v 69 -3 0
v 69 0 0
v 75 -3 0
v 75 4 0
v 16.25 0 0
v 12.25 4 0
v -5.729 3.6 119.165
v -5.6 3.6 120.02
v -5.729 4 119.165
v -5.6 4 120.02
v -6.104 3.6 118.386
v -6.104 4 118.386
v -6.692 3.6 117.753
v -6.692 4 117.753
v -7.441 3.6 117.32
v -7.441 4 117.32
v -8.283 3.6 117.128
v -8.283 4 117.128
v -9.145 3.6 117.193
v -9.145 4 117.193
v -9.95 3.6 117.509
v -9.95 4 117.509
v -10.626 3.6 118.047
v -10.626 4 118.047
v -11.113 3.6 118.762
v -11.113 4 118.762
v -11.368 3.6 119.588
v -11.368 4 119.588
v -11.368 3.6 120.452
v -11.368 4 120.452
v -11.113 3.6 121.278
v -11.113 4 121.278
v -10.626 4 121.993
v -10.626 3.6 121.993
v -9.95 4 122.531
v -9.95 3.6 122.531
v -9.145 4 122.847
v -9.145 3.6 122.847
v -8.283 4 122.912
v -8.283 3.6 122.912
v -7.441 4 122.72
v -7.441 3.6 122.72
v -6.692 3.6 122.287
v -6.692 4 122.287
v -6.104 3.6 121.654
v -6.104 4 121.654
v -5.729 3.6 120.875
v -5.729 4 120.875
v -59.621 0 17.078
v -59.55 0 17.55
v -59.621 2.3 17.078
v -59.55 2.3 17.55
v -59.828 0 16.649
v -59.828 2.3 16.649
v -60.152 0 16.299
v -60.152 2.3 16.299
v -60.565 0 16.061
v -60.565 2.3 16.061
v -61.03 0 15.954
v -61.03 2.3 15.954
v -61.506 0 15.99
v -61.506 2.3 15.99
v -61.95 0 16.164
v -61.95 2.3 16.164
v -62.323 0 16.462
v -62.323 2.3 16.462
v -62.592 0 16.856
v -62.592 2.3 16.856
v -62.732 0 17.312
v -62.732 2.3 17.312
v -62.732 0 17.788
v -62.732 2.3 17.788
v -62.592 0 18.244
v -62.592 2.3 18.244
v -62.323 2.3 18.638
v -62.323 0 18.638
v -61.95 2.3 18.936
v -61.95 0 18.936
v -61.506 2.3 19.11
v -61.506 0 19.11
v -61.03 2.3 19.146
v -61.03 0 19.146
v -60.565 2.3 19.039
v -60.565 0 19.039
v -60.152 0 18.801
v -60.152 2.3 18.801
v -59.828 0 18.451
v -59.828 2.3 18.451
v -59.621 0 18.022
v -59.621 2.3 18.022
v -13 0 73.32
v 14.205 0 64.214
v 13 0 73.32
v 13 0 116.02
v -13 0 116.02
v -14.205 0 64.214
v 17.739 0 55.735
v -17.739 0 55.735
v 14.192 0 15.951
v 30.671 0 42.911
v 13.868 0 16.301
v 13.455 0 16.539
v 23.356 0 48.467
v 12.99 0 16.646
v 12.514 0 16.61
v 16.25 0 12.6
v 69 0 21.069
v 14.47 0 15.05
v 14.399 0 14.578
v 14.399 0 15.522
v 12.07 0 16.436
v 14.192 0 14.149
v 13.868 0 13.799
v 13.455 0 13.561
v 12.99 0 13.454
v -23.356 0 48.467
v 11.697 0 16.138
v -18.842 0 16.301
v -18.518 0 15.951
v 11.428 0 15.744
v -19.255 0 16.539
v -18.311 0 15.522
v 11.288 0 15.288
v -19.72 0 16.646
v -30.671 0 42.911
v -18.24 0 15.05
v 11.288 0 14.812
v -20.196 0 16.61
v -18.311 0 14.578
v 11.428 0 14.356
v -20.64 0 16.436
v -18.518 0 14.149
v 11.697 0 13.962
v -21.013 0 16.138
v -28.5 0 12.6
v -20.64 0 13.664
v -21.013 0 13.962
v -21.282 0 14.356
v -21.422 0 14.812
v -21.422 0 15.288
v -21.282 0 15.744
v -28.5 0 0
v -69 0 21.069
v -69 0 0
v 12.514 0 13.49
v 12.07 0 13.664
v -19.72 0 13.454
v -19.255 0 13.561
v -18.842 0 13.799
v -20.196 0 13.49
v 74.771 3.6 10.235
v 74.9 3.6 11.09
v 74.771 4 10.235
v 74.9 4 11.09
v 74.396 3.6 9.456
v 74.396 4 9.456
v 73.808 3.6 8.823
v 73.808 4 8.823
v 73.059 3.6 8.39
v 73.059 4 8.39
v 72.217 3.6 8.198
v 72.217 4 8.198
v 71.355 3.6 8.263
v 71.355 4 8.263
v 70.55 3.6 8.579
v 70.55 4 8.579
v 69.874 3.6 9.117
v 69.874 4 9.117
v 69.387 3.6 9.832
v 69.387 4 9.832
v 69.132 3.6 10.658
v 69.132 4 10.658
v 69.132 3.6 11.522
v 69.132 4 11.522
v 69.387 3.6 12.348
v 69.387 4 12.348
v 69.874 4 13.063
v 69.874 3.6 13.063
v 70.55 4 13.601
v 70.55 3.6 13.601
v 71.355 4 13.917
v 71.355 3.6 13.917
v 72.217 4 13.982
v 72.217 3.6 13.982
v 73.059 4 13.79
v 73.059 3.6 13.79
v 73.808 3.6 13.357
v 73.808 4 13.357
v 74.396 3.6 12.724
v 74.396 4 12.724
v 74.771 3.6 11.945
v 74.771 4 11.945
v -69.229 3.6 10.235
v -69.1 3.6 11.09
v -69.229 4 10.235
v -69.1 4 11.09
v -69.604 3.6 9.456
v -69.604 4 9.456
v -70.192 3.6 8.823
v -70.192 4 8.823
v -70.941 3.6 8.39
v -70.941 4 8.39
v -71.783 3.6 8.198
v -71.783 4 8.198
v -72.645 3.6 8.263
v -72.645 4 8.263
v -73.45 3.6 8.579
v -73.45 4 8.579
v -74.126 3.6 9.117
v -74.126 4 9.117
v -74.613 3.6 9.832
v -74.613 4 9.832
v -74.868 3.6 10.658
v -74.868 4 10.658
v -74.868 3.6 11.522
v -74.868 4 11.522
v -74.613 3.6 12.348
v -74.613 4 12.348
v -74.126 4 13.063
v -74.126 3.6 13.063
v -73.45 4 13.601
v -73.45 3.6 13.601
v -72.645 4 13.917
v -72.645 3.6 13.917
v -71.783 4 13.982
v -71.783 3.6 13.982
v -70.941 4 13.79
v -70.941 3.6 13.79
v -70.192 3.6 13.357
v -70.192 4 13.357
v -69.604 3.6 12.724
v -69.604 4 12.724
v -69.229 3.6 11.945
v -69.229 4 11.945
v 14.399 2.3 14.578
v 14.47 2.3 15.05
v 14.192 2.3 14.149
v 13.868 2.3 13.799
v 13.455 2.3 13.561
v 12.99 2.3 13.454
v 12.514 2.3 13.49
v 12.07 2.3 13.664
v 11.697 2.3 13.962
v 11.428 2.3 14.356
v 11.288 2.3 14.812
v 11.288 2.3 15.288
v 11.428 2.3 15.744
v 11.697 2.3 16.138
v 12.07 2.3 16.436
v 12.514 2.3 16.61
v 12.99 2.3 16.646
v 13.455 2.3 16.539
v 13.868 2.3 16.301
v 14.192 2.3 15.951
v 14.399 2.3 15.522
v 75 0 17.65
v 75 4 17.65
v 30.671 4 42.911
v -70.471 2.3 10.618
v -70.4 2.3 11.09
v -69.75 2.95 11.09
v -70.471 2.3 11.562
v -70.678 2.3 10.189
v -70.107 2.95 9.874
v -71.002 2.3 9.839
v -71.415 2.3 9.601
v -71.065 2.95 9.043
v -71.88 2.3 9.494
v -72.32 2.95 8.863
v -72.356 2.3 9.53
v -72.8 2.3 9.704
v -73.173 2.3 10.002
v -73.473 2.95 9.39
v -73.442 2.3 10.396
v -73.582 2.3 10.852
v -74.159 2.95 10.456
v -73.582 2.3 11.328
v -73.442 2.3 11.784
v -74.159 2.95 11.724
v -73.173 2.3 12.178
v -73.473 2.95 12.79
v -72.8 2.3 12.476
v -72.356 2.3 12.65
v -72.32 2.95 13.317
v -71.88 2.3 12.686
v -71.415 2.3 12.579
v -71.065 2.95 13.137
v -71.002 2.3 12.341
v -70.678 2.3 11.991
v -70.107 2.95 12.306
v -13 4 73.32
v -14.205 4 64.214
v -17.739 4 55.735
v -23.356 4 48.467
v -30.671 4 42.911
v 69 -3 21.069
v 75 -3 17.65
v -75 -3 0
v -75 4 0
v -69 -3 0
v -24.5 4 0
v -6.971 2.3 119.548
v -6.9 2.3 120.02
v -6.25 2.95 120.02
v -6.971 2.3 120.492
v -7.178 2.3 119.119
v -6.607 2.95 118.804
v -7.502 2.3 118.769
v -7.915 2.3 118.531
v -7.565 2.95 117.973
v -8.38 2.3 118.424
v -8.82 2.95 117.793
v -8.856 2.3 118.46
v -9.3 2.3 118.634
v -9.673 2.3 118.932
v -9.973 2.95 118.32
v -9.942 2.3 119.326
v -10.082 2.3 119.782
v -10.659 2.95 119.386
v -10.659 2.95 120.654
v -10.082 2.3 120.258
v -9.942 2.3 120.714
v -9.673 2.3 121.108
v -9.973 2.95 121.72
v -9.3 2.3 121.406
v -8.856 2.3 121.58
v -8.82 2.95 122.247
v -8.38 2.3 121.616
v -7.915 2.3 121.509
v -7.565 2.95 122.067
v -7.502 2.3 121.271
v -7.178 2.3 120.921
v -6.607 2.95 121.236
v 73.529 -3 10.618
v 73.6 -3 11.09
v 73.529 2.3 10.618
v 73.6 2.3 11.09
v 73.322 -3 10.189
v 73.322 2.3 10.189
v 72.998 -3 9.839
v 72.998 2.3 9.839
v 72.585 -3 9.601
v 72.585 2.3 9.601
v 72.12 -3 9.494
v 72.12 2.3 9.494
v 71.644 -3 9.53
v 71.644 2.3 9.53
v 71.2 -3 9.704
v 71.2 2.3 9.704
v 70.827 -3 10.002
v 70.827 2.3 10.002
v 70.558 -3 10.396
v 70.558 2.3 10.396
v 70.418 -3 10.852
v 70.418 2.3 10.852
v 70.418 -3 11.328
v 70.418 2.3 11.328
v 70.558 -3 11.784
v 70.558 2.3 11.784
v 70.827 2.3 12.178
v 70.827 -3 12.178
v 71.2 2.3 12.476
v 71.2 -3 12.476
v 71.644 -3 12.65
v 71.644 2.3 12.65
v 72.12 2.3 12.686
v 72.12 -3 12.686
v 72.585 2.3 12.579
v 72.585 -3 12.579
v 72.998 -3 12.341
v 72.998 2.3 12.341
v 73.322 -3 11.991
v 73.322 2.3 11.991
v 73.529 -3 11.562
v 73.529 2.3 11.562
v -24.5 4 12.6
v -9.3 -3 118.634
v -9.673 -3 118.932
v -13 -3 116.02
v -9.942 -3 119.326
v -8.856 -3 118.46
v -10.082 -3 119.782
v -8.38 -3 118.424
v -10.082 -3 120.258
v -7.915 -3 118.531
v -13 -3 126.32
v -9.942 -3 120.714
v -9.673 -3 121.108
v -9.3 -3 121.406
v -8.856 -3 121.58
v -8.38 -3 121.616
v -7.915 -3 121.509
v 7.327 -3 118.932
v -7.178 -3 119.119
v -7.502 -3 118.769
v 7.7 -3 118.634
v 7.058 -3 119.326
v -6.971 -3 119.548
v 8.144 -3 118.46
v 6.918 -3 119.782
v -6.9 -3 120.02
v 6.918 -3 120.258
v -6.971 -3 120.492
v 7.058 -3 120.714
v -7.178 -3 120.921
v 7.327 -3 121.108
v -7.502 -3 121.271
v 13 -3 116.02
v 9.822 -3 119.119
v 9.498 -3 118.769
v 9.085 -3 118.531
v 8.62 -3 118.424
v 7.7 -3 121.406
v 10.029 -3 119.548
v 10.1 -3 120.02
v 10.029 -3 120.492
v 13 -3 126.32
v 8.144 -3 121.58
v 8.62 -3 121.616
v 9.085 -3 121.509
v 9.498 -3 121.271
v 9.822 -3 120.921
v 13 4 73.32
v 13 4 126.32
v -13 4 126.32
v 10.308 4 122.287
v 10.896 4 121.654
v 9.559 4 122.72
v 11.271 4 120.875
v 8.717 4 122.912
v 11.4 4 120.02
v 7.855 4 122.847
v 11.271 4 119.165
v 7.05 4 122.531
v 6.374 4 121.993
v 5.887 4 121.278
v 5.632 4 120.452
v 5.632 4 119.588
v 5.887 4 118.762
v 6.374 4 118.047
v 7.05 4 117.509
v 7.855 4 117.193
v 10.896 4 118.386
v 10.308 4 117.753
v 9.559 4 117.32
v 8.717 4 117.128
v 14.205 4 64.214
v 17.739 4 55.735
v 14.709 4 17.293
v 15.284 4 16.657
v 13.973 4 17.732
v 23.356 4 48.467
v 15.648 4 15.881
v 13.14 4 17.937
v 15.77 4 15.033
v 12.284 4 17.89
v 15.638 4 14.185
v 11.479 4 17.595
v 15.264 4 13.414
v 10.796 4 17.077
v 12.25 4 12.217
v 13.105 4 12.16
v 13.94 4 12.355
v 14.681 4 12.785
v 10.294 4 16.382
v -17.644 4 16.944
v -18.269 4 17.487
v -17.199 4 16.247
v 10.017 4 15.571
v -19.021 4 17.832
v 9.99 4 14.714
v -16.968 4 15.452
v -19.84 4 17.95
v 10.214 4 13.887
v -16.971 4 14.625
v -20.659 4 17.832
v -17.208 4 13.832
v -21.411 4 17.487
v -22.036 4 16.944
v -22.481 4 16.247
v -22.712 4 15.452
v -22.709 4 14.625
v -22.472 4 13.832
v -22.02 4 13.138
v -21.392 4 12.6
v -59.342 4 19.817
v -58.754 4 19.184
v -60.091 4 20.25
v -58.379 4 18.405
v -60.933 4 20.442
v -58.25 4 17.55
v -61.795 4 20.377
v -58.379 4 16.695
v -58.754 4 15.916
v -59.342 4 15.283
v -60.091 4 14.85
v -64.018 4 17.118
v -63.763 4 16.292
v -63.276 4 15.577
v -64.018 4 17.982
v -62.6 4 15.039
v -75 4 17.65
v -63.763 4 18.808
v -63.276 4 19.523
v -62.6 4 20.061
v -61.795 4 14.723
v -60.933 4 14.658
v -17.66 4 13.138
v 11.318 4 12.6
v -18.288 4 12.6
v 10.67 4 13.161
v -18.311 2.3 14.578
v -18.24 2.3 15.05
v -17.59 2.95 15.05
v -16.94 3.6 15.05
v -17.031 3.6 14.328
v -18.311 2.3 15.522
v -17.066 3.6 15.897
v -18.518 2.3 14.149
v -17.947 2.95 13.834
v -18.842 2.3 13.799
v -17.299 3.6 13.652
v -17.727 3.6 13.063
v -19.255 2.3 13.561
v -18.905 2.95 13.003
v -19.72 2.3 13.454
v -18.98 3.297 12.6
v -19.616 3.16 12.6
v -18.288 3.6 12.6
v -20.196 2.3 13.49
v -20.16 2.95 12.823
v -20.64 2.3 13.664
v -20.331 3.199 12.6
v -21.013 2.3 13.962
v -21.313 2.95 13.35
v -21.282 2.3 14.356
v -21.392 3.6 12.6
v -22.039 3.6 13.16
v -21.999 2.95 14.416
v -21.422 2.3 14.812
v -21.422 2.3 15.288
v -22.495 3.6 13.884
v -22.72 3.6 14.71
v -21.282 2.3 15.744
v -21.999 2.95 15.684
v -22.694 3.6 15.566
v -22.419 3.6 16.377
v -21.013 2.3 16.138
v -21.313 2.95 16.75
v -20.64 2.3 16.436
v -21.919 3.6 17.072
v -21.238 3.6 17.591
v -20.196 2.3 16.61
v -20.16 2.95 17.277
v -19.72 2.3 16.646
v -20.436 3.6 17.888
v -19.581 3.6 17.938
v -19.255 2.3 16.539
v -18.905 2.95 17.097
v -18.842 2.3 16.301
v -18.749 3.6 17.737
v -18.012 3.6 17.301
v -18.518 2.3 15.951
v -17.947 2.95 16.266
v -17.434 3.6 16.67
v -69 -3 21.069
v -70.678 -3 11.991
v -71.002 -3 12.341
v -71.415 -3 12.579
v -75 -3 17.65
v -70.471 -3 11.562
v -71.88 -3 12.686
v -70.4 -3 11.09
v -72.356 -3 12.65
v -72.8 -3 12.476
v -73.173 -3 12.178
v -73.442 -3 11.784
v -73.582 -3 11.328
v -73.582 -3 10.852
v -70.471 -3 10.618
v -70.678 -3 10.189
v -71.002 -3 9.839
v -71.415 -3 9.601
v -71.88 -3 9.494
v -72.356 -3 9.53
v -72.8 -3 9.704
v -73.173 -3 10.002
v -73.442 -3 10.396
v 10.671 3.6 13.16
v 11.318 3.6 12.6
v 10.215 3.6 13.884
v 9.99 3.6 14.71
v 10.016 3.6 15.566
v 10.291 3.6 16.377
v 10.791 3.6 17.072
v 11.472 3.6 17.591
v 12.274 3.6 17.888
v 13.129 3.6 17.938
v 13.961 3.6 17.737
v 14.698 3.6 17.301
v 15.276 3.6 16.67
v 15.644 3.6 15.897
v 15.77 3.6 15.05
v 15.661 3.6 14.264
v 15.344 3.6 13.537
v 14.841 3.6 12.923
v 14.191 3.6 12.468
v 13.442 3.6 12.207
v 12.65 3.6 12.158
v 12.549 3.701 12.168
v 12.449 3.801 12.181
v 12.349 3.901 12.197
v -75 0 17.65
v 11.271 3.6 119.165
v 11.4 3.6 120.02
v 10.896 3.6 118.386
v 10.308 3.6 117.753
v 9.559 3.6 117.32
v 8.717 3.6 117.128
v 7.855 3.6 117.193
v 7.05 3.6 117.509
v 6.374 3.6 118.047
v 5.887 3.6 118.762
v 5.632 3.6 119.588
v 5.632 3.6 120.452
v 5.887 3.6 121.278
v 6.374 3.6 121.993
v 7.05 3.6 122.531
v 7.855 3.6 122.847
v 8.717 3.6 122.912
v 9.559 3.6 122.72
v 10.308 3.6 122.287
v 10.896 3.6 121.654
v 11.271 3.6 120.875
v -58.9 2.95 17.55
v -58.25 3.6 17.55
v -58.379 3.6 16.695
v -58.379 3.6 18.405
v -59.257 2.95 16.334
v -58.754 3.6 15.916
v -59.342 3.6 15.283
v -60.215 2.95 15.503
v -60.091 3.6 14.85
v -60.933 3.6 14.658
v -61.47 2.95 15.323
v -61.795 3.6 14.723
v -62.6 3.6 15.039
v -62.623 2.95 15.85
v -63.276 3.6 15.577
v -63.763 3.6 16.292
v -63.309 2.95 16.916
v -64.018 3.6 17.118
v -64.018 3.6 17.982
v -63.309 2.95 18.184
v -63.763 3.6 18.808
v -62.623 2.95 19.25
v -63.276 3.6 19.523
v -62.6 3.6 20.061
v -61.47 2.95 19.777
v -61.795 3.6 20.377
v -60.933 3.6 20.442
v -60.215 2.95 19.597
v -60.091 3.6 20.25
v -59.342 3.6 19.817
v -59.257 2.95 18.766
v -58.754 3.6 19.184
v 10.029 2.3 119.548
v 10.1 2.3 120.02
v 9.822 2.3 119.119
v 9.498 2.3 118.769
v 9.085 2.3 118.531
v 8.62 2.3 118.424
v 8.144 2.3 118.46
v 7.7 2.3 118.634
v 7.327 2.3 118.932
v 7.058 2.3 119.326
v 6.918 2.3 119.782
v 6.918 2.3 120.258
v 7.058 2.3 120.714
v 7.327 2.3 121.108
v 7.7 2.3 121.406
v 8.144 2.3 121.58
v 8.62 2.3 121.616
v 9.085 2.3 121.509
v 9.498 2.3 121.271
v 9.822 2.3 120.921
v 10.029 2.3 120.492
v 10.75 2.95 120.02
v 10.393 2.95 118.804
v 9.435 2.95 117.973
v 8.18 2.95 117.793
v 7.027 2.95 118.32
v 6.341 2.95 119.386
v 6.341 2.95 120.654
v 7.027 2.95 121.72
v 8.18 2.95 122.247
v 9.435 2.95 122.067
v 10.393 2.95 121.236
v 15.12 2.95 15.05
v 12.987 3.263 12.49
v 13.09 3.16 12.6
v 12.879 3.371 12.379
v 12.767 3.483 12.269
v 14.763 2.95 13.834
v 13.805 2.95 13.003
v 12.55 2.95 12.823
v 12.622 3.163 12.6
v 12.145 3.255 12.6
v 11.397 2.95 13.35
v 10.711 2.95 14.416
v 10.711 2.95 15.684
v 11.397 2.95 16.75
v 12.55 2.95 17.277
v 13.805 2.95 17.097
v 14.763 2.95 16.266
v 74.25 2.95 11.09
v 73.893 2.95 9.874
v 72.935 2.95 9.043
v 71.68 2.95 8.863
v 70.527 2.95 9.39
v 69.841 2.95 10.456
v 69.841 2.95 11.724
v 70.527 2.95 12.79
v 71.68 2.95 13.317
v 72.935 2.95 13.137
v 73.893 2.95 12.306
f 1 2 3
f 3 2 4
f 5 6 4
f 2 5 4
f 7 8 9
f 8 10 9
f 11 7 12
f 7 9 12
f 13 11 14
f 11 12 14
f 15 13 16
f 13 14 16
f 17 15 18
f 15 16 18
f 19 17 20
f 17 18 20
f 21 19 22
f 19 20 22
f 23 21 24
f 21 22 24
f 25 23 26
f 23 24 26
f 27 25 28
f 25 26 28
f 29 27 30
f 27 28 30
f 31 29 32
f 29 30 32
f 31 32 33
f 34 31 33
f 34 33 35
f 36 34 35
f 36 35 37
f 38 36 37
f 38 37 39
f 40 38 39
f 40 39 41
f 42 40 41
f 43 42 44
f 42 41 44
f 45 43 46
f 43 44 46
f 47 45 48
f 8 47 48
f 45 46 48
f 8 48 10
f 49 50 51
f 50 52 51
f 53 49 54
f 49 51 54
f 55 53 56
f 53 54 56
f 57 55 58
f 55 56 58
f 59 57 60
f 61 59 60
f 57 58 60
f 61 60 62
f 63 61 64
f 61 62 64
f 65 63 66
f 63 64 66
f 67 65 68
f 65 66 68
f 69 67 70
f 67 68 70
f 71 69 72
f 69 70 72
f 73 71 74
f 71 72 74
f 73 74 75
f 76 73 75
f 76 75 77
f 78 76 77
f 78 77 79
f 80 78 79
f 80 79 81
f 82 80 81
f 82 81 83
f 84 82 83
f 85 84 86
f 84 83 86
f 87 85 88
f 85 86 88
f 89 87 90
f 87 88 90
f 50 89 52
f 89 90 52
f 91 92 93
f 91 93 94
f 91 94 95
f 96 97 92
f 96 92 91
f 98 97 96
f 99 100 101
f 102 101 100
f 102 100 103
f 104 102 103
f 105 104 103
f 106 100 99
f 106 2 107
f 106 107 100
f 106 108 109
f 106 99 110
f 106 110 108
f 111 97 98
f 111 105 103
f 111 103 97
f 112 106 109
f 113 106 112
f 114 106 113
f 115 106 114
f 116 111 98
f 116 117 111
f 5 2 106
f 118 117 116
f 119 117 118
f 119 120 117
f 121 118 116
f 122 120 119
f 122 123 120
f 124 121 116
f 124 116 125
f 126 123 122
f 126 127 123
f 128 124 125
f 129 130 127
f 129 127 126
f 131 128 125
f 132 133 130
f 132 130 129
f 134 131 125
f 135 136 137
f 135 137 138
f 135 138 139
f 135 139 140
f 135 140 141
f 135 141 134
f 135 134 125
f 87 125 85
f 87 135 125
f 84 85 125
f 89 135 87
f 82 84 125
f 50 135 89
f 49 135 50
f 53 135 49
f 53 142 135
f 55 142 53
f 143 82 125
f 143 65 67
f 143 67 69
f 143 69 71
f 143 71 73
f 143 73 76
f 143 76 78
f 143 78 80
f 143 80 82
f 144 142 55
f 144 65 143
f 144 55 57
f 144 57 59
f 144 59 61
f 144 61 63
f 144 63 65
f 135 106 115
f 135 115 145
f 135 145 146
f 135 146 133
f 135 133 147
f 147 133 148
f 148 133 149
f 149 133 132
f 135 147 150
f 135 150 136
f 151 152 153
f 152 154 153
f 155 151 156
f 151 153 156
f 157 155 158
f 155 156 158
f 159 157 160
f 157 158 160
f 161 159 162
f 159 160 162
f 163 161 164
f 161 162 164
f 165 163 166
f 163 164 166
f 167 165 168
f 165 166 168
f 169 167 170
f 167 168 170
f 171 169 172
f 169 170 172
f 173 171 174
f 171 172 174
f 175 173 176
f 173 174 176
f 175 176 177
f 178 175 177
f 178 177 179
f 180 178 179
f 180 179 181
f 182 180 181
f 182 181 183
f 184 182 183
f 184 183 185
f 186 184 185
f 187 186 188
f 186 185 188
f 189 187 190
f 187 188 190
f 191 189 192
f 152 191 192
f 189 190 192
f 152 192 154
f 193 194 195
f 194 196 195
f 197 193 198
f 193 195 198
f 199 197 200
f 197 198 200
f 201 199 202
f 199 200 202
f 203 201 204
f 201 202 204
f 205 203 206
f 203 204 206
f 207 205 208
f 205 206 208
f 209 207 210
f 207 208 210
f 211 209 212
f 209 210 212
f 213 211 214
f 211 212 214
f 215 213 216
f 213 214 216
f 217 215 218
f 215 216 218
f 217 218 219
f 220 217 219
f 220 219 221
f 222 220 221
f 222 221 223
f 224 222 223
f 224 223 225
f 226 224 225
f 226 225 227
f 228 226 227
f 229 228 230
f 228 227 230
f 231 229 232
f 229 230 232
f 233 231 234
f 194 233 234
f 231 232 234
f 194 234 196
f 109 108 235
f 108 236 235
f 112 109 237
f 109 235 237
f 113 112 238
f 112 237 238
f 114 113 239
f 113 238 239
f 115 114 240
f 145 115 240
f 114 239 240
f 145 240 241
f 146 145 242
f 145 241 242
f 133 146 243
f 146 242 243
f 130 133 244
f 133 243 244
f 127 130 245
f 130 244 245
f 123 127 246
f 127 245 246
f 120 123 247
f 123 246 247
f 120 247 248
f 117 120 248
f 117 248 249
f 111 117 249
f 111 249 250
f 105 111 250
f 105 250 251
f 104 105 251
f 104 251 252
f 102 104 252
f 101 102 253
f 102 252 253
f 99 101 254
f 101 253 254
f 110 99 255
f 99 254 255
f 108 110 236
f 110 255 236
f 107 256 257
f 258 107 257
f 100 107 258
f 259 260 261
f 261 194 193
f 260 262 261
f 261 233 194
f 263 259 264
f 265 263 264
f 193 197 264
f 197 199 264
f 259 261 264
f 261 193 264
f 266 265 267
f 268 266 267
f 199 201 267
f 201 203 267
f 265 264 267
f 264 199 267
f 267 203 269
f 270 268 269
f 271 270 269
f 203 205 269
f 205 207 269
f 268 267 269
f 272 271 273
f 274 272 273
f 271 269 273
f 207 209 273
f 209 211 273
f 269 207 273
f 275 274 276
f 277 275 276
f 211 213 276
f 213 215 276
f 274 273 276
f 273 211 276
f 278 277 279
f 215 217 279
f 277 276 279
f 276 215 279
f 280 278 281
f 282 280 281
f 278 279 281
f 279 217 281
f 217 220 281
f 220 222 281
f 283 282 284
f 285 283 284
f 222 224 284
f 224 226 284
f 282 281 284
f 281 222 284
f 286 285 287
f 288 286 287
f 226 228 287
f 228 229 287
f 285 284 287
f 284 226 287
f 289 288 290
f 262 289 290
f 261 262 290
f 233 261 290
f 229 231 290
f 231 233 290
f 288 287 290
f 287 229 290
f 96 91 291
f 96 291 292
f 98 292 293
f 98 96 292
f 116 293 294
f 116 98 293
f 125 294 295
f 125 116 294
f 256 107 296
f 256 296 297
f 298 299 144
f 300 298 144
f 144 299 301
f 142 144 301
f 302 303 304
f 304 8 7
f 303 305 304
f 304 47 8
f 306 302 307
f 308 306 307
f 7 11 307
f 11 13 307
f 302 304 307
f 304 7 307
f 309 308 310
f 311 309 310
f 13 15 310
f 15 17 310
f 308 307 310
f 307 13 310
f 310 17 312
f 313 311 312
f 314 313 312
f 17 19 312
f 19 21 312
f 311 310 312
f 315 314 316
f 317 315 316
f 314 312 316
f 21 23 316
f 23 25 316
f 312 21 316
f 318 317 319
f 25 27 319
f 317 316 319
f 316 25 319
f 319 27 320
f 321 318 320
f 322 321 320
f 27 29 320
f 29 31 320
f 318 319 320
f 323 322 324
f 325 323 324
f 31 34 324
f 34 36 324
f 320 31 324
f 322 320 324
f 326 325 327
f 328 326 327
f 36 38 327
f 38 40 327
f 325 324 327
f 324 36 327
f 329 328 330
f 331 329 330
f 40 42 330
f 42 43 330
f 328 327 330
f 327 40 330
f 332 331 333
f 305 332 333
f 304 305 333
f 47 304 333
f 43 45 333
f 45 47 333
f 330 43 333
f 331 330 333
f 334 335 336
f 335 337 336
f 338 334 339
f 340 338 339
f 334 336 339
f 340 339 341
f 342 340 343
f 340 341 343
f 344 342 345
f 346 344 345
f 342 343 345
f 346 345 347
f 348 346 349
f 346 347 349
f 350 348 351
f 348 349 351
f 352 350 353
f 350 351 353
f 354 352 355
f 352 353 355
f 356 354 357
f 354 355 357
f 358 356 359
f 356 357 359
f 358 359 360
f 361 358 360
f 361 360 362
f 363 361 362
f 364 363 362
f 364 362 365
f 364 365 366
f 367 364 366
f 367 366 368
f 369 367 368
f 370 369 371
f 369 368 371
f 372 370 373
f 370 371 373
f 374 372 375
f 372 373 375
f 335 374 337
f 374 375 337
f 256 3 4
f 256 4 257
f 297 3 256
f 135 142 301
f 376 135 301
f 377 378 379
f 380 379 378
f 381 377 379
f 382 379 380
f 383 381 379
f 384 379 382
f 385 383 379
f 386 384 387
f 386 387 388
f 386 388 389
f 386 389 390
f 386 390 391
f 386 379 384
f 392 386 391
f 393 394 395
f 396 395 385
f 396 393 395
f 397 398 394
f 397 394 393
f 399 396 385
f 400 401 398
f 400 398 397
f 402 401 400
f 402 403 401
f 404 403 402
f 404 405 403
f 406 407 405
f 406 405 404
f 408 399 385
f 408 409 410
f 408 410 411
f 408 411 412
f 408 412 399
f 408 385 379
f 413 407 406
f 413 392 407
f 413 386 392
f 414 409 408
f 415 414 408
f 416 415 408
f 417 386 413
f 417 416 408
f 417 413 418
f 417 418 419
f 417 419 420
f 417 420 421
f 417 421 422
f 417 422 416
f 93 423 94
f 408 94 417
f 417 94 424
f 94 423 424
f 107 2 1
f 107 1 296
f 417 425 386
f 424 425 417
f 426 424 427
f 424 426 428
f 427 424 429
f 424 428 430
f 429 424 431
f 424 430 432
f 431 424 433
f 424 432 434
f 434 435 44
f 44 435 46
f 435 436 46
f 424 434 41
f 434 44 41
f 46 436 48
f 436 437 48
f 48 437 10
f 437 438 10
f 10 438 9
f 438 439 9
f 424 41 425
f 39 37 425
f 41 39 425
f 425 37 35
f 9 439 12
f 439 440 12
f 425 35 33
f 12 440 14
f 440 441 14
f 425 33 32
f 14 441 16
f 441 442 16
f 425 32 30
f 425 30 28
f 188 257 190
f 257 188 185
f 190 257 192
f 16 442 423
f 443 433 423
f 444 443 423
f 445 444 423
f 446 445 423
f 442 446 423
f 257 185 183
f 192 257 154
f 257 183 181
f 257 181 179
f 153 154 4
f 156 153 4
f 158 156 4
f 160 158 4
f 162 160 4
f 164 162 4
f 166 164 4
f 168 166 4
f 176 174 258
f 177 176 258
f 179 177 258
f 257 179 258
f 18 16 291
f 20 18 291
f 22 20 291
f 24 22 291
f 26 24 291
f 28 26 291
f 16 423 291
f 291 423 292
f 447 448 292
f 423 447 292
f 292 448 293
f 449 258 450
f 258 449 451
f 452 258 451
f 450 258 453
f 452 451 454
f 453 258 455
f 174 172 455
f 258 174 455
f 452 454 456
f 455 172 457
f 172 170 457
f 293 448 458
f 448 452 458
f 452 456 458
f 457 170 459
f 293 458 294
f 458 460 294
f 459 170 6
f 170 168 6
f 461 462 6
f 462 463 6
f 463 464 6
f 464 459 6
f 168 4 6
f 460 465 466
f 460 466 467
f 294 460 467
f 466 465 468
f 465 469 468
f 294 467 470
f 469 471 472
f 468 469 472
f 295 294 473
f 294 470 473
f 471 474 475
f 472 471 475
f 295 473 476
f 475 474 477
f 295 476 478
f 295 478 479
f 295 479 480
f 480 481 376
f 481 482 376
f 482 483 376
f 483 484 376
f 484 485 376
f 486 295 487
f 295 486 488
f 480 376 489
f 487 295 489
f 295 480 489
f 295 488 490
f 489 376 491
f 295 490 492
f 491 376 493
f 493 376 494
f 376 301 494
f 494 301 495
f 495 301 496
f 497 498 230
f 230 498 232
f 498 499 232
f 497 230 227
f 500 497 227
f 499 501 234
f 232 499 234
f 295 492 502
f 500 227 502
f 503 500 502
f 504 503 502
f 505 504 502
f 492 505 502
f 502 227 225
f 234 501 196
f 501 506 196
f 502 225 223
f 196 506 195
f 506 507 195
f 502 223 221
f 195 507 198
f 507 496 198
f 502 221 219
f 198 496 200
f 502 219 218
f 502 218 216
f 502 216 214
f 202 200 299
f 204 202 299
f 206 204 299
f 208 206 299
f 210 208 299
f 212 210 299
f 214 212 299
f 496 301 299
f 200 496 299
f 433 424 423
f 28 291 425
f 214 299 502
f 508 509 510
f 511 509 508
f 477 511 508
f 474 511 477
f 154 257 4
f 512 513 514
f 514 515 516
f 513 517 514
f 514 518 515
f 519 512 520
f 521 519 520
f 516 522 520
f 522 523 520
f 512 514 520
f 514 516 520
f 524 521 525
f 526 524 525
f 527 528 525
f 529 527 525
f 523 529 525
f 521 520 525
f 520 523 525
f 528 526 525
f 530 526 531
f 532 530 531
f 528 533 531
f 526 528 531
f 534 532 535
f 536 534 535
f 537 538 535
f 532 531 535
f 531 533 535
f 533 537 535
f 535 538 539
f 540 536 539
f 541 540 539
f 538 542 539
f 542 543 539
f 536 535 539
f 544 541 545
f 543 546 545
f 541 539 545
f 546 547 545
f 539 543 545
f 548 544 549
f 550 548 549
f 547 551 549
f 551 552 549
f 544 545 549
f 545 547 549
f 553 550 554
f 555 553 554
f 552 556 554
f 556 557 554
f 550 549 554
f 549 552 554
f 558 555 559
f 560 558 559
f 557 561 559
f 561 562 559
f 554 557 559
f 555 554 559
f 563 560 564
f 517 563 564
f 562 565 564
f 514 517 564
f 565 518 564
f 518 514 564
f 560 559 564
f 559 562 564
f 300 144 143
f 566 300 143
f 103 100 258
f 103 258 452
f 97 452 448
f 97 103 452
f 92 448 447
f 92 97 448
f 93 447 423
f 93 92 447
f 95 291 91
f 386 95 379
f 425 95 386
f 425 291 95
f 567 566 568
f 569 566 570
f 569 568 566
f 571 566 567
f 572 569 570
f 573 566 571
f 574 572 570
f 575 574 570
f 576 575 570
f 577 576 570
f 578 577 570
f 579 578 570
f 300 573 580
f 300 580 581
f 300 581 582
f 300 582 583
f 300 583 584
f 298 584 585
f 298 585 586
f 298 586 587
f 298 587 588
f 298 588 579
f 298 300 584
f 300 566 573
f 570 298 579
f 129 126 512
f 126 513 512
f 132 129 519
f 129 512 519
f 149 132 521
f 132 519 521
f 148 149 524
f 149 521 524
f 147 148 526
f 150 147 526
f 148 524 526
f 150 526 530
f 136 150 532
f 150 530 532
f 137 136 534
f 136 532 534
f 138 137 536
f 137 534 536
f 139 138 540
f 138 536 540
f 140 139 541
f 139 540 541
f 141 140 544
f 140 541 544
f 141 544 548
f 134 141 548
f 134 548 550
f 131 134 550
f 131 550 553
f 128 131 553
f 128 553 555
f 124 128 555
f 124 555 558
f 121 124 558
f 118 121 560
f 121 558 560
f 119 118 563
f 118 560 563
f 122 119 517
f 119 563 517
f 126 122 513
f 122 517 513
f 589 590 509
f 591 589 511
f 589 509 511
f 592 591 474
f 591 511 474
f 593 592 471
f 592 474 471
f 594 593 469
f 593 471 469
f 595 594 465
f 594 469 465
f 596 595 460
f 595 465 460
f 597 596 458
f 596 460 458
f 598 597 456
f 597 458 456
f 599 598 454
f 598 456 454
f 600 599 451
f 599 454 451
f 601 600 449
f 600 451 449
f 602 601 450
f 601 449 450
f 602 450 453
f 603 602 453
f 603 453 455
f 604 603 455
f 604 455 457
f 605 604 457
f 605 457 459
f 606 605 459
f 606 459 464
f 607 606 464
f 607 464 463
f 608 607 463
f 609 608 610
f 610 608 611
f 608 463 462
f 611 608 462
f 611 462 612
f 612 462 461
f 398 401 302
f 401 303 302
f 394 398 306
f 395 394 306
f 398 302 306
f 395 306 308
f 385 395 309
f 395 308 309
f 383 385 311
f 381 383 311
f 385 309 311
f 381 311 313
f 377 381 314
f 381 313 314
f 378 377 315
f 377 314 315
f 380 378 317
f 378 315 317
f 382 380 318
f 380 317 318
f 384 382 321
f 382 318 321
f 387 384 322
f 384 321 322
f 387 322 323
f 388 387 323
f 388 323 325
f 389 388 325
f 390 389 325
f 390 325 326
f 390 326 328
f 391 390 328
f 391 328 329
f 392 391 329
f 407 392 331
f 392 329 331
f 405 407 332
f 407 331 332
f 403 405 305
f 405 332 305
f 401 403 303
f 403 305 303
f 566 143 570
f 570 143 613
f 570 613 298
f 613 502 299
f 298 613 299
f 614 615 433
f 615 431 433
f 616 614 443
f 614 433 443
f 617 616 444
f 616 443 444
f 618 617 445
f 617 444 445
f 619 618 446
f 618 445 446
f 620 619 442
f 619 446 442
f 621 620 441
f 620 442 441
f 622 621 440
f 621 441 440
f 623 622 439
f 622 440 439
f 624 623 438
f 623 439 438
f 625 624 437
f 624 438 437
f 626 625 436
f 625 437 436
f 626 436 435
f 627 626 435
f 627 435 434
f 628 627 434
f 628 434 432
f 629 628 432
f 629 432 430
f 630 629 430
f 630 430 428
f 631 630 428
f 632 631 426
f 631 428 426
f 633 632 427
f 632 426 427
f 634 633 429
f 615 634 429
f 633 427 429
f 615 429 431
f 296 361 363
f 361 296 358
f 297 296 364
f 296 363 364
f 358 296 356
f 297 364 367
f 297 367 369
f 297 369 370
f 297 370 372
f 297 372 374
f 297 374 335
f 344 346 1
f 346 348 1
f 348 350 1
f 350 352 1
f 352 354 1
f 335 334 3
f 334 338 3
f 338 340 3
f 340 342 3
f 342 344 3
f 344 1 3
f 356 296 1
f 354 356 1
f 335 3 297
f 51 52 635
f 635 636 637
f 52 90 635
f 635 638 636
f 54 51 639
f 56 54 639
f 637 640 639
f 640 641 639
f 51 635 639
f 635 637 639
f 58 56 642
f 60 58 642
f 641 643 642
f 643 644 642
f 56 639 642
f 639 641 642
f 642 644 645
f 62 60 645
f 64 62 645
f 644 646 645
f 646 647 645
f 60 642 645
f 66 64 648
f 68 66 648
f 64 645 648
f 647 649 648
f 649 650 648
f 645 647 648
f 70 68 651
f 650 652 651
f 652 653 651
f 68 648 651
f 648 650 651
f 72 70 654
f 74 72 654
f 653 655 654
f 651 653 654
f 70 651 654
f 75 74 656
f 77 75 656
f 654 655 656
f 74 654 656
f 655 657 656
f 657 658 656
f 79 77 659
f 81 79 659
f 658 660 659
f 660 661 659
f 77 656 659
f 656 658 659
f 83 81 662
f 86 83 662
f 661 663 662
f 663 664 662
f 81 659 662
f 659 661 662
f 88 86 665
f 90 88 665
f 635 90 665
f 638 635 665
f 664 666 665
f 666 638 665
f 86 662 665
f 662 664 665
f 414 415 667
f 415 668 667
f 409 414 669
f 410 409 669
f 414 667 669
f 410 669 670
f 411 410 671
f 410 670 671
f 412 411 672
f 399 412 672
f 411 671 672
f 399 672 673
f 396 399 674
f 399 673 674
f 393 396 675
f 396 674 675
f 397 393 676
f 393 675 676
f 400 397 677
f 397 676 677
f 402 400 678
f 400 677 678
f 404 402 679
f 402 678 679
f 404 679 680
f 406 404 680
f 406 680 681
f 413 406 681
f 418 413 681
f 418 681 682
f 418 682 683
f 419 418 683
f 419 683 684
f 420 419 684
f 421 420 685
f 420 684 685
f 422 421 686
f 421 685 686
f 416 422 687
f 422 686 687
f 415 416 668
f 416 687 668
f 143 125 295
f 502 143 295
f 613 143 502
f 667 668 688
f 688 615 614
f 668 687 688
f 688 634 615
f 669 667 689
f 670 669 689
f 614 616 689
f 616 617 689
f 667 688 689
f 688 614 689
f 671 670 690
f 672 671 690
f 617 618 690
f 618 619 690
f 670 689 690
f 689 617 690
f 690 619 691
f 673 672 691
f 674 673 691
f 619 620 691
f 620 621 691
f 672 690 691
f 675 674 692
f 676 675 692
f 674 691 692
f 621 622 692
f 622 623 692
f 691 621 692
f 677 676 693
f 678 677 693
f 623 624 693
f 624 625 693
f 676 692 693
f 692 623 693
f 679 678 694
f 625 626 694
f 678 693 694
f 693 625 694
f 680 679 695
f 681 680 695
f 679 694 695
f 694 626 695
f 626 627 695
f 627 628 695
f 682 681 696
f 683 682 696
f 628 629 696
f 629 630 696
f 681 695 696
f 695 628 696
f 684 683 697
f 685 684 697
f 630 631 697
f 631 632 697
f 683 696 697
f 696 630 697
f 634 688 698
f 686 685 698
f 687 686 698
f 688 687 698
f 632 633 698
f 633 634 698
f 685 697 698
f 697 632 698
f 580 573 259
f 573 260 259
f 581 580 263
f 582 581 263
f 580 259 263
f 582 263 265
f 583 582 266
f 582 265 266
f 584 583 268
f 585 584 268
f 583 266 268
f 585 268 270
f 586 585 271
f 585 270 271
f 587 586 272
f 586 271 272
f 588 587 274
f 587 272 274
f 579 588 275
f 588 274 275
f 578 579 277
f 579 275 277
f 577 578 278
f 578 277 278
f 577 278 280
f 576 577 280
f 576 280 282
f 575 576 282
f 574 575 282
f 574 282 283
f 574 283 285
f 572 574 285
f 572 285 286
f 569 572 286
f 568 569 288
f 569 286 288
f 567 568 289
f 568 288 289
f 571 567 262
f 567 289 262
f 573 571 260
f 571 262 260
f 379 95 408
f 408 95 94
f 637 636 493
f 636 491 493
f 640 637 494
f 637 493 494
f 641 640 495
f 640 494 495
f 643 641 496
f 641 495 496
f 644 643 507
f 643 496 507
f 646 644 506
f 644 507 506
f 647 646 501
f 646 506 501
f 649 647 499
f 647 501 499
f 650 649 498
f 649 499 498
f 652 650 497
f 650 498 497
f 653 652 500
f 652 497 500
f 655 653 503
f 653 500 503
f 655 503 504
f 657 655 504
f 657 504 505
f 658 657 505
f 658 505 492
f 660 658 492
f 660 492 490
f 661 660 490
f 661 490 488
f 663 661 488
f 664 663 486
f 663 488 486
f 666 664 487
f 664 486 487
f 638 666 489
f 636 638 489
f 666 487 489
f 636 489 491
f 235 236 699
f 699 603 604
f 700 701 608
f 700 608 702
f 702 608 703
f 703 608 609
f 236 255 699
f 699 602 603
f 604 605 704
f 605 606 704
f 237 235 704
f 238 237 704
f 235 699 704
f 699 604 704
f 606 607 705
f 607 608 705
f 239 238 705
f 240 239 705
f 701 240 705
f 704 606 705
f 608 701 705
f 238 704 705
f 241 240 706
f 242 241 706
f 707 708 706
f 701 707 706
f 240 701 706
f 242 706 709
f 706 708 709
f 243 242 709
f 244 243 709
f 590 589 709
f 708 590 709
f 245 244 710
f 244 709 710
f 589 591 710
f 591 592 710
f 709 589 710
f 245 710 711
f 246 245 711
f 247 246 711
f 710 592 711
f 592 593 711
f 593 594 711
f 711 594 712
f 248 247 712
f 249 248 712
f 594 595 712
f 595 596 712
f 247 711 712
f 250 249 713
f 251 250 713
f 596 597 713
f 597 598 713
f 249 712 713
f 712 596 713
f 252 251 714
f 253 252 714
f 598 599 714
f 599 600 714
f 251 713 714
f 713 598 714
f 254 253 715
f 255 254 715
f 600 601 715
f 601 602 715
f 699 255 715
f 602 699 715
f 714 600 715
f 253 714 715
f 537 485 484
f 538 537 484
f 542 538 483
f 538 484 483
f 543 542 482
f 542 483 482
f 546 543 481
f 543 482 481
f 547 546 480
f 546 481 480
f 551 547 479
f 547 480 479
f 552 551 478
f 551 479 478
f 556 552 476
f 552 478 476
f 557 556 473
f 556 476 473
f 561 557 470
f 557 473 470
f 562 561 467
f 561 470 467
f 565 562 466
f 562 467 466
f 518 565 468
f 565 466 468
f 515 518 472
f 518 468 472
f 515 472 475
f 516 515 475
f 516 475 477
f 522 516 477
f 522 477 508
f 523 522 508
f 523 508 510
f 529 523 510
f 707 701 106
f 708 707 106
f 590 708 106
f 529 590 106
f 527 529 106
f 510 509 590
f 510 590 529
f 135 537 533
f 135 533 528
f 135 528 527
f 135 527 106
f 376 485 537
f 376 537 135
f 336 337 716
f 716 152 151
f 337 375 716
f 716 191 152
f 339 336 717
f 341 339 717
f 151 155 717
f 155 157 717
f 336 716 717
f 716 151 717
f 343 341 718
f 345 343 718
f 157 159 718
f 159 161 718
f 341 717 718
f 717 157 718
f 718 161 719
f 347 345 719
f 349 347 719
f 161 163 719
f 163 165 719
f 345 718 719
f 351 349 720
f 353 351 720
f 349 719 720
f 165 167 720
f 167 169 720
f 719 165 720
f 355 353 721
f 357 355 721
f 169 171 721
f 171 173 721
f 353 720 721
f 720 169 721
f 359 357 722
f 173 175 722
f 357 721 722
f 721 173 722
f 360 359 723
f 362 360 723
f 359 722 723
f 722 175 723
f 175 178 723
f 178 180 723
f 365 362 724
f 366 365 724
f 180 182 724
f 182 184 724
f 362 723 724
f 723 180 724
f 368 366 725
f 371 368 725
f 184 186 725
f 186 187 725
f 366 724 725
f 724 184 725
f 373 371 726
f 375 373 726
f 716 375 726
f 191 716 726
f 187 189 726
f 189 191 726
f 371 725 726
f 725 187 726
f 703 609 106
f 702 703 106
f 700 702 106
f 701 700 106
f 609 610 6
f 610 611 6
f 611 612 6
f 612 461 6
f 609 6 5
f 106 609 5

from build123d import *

# Parameters (mm, degrees)
BOSS_EXTRU_1_DEPTH       = 4
BOSS_EXTRU_6_DEPTH       = 3
ESQUISSE22_W             = 26
ESQUISSE22_H             = 11.3
BOSS_EXTRU_7_DEPTH       = 3
ENL_V_MAT_EXTRU_9_DEPTH  = 12.6
ENL_V_MAT_EXTRU_10_REACH = 149.934
ESQUISSE23_W             = 26
ESQUISSE23_H             = 1


# Read off the part's stored shape, not the designer's step: Fraisage pour vis à tête fraisée à 6 pans creux M31
with BuildPart() as part:
    # Esquisse1 → Boss.-Extru.1 (new body)
    with BuildSketch(Plane(origin=(0, 0, 0), x_dir=(1, 0, 0), z_dir=(0, 1, 0))):
        with BuildLine():
            Line((-13, -127.32), (-13, -73.32))
            ThreePointArc((-13, -73.32), (-17.738590223, -55.734577677), (-30.671261616, -42.910875941))
            Line((-30.671261616, -42.910875941), (-75, -17.65))
            Line((-75, -17.65), (-75, 0))
            Line((-75, 0), (75, 0))
            Line((75, 0), (75, -17.65))
            Line((75, -17.65), (30.671261616, -42.910875941))
            ThreePointArc((30.671261616, -42.910875941), (17.738590223, -55.734577677), (13, -73.32))
            Line((13, -73.32), (13, -127.32))
            Line((13, -127.32), (-13, -127.32))
        make_face()
    extrude(amount=BOSS_EXTRU_1_DEPTH)

    # Esquisse21 → Boss.-Extru.6 (add)
    with BuildSketch(Plane(origin=(0, 0, 0), x_dir=(-1, 0, 0), z_dir=(0, -1, 0))):
        Polygon((75, 0), (69, 0), (69, -21.069119541), (75, -17.65), align=None)
        Polygon((-75, 0), (-69, 0), (-69, -21.069119541), (-75, -17.65), align=None)
    extrude(amount=BOSS_EXTRU_6_DEPTH)

    # Esquisse22 → Boss.-Extru.7 (add)
    with BuildSketch(Plane.XZ):
        with Locations((0, 121.67)):
            Rectangle(ESQUISSE22_W, ESQUISSE22_H)
    extrude(amount=BOSS_EXTRU_7_DEPTH)

    # Fraisage pour vis _ t_te frais_e _ 6 2 → Fraisage pour vis à tête fraisée à 6 pans creux M31 (revolve, cut)
    with BuildSketch(Plane(origin=(8.5, 0, 120.02), x_dir=(1, 0, 0), z_dir=(0, 0, 1))):
        Polygon((0, -3), (1.6, -3), (1.6, 2.3), (2.9, 3.6), (2.9, 4), (0, 4), align=None)
    revolve(axis=Axis((8.5, 0, 120.02), (0, 1, 0)), mode=Mode.SUBTRACT)

    # Fraisage pour vis _ t_te frais_e _ 6 3 o → Fraisage pour vis _ t_te frais_e _ 6 3 (revolve, cut)
    with BuildSketch(Plane(origin=(-8.5, 0, 120.02), x_dir=(1, 0, 0), z_dir=(0, 0, 1))):
        Polygon((0, -3), (1.6, -3), (1.6, 2.3), (2.9, 3.6), (2.9, 4), (0, 4), align=None)
    revolve(axis=Axis((-8.5, 0, 120.02), (0, 1, 0)), mode=Mode.SUBTRACT)

    # Fraisage pour vis _ t_te frais_e _ 6 4 o → Fraisage pour vis _ t_te frais_e _ 6 4 (revolve, cut)
    with BuildSketch(Plane(origin=(-61.15, 0, 17.55), x_dir=(1, 0, 0), z_dir=(0, 0, 1))):
        Polygon((0, 0), (1.6, 0), (1.6, 2.3), (2.9, 3.6), (2.9, 4), (0, 4), align=None)
    revolve(axis=Axis((-61.15, 0, 17.55), (0, 1, 0)), mode=Mode.SUBTRACT)

    # Fraisage pour vis _ t_te frais_e _ 6 5 o → Fraisage pour vis _ t_te frais_e _ 6 5 (revolve, cut)
    with BuildSketch(Plane(origin=(-72, 0, 11.09), x_dir=(1, 0, 0), z_dir=(0, 0, 1))):
        Polygon((0, -3), (1.6, -3), (1.6, 2.3), (2.9, 3.6), (2.9, 4), (0, 4), align=None)
    revolve(axis=Axis((-72, 0, 11.09), (0, 1, 0)), mode=Mode.SUBTRACT)

    # Fraisage pour vis _ t_te frais_e _ 6 6 o → Fraisage pour vis _ t_te frais_e _ 6 6 (revolve, cut)
    with BuildSketch(Plane(origin=(72, 0, 11.09), x_dir=(1, 0, 0), z_dir=(0, 0, 1))):
        Polygon((0, -3), (1.6, -3), (1.6, 2.3), (2.9, 3.6), (2.9, 4), (0, 4), align=None)
    revolve(axis=Axis((72, 0, 11.09), (0, 1, 0)), mode=Mode.SUBTRACT)

    # Fraisage pour vis _ t_te frais_e _ 6 7 o → Fraisage pour vis _ t_te frais_e _ 6 7 (revolve, cut)
    with BuildSketch(Plane(origin=(12.87, 0, 15.05), x_dir=(1, 0, 0), z_dir=(0, 0, 1))):
        Polygon((0, 0), (1.6, 0), (1.6, 2.3), (2.9, 3.6), (2.9, 4), (0, 4), align=None)
    revolve(axis=Axis((12.87, 0, 15.05), (0, 1, 0)), mode=Mode.SUBTRACT)

    # Fraisage pour vis _ t_te frais_e _ 6 8 o → Fraisage pour vis _ t_te frais_e _ 6 8 (revolve, cut)
    with BuildSketch(Plane(origin=(-19.84, 0, 15.05), x_dir=(1, 0, 0), z_dir=(0, 0, 1))):
        Polygon((0, 0), (1.6, 0), (1.6, 2.3), (2.9, 3.6), (2.9, 4), (0, 4), align=None)
    revolve(axis=Axis((-19.84, 0, 15.05), (0, 1, 0)), mode=Mode.SUBTRACT)

    # Esquisse16 → Enlèv. mat.-Extru.9 (cut)
    with BuildSketch(Plane(origin=(0, 0, 0), x_dir=(-1, 0, 0), z_dir=(0, 0, -1))):
        Polygon((28.5, 0), (24.5, 4), (-12.25, 4), (-16.25, 0), align=None)
    extrude(amount=-ENL_V_MAT_EXTRU_9_DEPTH, mode=Mode.SUBTRACT)

    # Esquisse23 → Enlèv. mat.-Extru.10 (cut, up to next)
    with BuildSketch(Plane(origin=(0, 4, 0), x_dir=(1, 0, 0), z_dir=(0, 1, 0)), mode=Mode.PRIVATE) as enl_v_mat_extru_10_sk1:
        with Locations((0, -126.82)):
            Rectangle(ESQUISSE23_W, ESQUISSE23_H)
    enl_v_mat_extru_10_tool1 = extrude(enl_v_mat_extru_10_sk1.sketch, amount=-ENL_V_MAT_EXTRU_10_REACH, mode=Mode.PRIVATE) & part.part
    add(enl_v_mat_extru_10_tool1.solids().sort_by_distance((0, 4, 126.82))[0], mode=Mode.SUBTRACT)


solid = part.part
